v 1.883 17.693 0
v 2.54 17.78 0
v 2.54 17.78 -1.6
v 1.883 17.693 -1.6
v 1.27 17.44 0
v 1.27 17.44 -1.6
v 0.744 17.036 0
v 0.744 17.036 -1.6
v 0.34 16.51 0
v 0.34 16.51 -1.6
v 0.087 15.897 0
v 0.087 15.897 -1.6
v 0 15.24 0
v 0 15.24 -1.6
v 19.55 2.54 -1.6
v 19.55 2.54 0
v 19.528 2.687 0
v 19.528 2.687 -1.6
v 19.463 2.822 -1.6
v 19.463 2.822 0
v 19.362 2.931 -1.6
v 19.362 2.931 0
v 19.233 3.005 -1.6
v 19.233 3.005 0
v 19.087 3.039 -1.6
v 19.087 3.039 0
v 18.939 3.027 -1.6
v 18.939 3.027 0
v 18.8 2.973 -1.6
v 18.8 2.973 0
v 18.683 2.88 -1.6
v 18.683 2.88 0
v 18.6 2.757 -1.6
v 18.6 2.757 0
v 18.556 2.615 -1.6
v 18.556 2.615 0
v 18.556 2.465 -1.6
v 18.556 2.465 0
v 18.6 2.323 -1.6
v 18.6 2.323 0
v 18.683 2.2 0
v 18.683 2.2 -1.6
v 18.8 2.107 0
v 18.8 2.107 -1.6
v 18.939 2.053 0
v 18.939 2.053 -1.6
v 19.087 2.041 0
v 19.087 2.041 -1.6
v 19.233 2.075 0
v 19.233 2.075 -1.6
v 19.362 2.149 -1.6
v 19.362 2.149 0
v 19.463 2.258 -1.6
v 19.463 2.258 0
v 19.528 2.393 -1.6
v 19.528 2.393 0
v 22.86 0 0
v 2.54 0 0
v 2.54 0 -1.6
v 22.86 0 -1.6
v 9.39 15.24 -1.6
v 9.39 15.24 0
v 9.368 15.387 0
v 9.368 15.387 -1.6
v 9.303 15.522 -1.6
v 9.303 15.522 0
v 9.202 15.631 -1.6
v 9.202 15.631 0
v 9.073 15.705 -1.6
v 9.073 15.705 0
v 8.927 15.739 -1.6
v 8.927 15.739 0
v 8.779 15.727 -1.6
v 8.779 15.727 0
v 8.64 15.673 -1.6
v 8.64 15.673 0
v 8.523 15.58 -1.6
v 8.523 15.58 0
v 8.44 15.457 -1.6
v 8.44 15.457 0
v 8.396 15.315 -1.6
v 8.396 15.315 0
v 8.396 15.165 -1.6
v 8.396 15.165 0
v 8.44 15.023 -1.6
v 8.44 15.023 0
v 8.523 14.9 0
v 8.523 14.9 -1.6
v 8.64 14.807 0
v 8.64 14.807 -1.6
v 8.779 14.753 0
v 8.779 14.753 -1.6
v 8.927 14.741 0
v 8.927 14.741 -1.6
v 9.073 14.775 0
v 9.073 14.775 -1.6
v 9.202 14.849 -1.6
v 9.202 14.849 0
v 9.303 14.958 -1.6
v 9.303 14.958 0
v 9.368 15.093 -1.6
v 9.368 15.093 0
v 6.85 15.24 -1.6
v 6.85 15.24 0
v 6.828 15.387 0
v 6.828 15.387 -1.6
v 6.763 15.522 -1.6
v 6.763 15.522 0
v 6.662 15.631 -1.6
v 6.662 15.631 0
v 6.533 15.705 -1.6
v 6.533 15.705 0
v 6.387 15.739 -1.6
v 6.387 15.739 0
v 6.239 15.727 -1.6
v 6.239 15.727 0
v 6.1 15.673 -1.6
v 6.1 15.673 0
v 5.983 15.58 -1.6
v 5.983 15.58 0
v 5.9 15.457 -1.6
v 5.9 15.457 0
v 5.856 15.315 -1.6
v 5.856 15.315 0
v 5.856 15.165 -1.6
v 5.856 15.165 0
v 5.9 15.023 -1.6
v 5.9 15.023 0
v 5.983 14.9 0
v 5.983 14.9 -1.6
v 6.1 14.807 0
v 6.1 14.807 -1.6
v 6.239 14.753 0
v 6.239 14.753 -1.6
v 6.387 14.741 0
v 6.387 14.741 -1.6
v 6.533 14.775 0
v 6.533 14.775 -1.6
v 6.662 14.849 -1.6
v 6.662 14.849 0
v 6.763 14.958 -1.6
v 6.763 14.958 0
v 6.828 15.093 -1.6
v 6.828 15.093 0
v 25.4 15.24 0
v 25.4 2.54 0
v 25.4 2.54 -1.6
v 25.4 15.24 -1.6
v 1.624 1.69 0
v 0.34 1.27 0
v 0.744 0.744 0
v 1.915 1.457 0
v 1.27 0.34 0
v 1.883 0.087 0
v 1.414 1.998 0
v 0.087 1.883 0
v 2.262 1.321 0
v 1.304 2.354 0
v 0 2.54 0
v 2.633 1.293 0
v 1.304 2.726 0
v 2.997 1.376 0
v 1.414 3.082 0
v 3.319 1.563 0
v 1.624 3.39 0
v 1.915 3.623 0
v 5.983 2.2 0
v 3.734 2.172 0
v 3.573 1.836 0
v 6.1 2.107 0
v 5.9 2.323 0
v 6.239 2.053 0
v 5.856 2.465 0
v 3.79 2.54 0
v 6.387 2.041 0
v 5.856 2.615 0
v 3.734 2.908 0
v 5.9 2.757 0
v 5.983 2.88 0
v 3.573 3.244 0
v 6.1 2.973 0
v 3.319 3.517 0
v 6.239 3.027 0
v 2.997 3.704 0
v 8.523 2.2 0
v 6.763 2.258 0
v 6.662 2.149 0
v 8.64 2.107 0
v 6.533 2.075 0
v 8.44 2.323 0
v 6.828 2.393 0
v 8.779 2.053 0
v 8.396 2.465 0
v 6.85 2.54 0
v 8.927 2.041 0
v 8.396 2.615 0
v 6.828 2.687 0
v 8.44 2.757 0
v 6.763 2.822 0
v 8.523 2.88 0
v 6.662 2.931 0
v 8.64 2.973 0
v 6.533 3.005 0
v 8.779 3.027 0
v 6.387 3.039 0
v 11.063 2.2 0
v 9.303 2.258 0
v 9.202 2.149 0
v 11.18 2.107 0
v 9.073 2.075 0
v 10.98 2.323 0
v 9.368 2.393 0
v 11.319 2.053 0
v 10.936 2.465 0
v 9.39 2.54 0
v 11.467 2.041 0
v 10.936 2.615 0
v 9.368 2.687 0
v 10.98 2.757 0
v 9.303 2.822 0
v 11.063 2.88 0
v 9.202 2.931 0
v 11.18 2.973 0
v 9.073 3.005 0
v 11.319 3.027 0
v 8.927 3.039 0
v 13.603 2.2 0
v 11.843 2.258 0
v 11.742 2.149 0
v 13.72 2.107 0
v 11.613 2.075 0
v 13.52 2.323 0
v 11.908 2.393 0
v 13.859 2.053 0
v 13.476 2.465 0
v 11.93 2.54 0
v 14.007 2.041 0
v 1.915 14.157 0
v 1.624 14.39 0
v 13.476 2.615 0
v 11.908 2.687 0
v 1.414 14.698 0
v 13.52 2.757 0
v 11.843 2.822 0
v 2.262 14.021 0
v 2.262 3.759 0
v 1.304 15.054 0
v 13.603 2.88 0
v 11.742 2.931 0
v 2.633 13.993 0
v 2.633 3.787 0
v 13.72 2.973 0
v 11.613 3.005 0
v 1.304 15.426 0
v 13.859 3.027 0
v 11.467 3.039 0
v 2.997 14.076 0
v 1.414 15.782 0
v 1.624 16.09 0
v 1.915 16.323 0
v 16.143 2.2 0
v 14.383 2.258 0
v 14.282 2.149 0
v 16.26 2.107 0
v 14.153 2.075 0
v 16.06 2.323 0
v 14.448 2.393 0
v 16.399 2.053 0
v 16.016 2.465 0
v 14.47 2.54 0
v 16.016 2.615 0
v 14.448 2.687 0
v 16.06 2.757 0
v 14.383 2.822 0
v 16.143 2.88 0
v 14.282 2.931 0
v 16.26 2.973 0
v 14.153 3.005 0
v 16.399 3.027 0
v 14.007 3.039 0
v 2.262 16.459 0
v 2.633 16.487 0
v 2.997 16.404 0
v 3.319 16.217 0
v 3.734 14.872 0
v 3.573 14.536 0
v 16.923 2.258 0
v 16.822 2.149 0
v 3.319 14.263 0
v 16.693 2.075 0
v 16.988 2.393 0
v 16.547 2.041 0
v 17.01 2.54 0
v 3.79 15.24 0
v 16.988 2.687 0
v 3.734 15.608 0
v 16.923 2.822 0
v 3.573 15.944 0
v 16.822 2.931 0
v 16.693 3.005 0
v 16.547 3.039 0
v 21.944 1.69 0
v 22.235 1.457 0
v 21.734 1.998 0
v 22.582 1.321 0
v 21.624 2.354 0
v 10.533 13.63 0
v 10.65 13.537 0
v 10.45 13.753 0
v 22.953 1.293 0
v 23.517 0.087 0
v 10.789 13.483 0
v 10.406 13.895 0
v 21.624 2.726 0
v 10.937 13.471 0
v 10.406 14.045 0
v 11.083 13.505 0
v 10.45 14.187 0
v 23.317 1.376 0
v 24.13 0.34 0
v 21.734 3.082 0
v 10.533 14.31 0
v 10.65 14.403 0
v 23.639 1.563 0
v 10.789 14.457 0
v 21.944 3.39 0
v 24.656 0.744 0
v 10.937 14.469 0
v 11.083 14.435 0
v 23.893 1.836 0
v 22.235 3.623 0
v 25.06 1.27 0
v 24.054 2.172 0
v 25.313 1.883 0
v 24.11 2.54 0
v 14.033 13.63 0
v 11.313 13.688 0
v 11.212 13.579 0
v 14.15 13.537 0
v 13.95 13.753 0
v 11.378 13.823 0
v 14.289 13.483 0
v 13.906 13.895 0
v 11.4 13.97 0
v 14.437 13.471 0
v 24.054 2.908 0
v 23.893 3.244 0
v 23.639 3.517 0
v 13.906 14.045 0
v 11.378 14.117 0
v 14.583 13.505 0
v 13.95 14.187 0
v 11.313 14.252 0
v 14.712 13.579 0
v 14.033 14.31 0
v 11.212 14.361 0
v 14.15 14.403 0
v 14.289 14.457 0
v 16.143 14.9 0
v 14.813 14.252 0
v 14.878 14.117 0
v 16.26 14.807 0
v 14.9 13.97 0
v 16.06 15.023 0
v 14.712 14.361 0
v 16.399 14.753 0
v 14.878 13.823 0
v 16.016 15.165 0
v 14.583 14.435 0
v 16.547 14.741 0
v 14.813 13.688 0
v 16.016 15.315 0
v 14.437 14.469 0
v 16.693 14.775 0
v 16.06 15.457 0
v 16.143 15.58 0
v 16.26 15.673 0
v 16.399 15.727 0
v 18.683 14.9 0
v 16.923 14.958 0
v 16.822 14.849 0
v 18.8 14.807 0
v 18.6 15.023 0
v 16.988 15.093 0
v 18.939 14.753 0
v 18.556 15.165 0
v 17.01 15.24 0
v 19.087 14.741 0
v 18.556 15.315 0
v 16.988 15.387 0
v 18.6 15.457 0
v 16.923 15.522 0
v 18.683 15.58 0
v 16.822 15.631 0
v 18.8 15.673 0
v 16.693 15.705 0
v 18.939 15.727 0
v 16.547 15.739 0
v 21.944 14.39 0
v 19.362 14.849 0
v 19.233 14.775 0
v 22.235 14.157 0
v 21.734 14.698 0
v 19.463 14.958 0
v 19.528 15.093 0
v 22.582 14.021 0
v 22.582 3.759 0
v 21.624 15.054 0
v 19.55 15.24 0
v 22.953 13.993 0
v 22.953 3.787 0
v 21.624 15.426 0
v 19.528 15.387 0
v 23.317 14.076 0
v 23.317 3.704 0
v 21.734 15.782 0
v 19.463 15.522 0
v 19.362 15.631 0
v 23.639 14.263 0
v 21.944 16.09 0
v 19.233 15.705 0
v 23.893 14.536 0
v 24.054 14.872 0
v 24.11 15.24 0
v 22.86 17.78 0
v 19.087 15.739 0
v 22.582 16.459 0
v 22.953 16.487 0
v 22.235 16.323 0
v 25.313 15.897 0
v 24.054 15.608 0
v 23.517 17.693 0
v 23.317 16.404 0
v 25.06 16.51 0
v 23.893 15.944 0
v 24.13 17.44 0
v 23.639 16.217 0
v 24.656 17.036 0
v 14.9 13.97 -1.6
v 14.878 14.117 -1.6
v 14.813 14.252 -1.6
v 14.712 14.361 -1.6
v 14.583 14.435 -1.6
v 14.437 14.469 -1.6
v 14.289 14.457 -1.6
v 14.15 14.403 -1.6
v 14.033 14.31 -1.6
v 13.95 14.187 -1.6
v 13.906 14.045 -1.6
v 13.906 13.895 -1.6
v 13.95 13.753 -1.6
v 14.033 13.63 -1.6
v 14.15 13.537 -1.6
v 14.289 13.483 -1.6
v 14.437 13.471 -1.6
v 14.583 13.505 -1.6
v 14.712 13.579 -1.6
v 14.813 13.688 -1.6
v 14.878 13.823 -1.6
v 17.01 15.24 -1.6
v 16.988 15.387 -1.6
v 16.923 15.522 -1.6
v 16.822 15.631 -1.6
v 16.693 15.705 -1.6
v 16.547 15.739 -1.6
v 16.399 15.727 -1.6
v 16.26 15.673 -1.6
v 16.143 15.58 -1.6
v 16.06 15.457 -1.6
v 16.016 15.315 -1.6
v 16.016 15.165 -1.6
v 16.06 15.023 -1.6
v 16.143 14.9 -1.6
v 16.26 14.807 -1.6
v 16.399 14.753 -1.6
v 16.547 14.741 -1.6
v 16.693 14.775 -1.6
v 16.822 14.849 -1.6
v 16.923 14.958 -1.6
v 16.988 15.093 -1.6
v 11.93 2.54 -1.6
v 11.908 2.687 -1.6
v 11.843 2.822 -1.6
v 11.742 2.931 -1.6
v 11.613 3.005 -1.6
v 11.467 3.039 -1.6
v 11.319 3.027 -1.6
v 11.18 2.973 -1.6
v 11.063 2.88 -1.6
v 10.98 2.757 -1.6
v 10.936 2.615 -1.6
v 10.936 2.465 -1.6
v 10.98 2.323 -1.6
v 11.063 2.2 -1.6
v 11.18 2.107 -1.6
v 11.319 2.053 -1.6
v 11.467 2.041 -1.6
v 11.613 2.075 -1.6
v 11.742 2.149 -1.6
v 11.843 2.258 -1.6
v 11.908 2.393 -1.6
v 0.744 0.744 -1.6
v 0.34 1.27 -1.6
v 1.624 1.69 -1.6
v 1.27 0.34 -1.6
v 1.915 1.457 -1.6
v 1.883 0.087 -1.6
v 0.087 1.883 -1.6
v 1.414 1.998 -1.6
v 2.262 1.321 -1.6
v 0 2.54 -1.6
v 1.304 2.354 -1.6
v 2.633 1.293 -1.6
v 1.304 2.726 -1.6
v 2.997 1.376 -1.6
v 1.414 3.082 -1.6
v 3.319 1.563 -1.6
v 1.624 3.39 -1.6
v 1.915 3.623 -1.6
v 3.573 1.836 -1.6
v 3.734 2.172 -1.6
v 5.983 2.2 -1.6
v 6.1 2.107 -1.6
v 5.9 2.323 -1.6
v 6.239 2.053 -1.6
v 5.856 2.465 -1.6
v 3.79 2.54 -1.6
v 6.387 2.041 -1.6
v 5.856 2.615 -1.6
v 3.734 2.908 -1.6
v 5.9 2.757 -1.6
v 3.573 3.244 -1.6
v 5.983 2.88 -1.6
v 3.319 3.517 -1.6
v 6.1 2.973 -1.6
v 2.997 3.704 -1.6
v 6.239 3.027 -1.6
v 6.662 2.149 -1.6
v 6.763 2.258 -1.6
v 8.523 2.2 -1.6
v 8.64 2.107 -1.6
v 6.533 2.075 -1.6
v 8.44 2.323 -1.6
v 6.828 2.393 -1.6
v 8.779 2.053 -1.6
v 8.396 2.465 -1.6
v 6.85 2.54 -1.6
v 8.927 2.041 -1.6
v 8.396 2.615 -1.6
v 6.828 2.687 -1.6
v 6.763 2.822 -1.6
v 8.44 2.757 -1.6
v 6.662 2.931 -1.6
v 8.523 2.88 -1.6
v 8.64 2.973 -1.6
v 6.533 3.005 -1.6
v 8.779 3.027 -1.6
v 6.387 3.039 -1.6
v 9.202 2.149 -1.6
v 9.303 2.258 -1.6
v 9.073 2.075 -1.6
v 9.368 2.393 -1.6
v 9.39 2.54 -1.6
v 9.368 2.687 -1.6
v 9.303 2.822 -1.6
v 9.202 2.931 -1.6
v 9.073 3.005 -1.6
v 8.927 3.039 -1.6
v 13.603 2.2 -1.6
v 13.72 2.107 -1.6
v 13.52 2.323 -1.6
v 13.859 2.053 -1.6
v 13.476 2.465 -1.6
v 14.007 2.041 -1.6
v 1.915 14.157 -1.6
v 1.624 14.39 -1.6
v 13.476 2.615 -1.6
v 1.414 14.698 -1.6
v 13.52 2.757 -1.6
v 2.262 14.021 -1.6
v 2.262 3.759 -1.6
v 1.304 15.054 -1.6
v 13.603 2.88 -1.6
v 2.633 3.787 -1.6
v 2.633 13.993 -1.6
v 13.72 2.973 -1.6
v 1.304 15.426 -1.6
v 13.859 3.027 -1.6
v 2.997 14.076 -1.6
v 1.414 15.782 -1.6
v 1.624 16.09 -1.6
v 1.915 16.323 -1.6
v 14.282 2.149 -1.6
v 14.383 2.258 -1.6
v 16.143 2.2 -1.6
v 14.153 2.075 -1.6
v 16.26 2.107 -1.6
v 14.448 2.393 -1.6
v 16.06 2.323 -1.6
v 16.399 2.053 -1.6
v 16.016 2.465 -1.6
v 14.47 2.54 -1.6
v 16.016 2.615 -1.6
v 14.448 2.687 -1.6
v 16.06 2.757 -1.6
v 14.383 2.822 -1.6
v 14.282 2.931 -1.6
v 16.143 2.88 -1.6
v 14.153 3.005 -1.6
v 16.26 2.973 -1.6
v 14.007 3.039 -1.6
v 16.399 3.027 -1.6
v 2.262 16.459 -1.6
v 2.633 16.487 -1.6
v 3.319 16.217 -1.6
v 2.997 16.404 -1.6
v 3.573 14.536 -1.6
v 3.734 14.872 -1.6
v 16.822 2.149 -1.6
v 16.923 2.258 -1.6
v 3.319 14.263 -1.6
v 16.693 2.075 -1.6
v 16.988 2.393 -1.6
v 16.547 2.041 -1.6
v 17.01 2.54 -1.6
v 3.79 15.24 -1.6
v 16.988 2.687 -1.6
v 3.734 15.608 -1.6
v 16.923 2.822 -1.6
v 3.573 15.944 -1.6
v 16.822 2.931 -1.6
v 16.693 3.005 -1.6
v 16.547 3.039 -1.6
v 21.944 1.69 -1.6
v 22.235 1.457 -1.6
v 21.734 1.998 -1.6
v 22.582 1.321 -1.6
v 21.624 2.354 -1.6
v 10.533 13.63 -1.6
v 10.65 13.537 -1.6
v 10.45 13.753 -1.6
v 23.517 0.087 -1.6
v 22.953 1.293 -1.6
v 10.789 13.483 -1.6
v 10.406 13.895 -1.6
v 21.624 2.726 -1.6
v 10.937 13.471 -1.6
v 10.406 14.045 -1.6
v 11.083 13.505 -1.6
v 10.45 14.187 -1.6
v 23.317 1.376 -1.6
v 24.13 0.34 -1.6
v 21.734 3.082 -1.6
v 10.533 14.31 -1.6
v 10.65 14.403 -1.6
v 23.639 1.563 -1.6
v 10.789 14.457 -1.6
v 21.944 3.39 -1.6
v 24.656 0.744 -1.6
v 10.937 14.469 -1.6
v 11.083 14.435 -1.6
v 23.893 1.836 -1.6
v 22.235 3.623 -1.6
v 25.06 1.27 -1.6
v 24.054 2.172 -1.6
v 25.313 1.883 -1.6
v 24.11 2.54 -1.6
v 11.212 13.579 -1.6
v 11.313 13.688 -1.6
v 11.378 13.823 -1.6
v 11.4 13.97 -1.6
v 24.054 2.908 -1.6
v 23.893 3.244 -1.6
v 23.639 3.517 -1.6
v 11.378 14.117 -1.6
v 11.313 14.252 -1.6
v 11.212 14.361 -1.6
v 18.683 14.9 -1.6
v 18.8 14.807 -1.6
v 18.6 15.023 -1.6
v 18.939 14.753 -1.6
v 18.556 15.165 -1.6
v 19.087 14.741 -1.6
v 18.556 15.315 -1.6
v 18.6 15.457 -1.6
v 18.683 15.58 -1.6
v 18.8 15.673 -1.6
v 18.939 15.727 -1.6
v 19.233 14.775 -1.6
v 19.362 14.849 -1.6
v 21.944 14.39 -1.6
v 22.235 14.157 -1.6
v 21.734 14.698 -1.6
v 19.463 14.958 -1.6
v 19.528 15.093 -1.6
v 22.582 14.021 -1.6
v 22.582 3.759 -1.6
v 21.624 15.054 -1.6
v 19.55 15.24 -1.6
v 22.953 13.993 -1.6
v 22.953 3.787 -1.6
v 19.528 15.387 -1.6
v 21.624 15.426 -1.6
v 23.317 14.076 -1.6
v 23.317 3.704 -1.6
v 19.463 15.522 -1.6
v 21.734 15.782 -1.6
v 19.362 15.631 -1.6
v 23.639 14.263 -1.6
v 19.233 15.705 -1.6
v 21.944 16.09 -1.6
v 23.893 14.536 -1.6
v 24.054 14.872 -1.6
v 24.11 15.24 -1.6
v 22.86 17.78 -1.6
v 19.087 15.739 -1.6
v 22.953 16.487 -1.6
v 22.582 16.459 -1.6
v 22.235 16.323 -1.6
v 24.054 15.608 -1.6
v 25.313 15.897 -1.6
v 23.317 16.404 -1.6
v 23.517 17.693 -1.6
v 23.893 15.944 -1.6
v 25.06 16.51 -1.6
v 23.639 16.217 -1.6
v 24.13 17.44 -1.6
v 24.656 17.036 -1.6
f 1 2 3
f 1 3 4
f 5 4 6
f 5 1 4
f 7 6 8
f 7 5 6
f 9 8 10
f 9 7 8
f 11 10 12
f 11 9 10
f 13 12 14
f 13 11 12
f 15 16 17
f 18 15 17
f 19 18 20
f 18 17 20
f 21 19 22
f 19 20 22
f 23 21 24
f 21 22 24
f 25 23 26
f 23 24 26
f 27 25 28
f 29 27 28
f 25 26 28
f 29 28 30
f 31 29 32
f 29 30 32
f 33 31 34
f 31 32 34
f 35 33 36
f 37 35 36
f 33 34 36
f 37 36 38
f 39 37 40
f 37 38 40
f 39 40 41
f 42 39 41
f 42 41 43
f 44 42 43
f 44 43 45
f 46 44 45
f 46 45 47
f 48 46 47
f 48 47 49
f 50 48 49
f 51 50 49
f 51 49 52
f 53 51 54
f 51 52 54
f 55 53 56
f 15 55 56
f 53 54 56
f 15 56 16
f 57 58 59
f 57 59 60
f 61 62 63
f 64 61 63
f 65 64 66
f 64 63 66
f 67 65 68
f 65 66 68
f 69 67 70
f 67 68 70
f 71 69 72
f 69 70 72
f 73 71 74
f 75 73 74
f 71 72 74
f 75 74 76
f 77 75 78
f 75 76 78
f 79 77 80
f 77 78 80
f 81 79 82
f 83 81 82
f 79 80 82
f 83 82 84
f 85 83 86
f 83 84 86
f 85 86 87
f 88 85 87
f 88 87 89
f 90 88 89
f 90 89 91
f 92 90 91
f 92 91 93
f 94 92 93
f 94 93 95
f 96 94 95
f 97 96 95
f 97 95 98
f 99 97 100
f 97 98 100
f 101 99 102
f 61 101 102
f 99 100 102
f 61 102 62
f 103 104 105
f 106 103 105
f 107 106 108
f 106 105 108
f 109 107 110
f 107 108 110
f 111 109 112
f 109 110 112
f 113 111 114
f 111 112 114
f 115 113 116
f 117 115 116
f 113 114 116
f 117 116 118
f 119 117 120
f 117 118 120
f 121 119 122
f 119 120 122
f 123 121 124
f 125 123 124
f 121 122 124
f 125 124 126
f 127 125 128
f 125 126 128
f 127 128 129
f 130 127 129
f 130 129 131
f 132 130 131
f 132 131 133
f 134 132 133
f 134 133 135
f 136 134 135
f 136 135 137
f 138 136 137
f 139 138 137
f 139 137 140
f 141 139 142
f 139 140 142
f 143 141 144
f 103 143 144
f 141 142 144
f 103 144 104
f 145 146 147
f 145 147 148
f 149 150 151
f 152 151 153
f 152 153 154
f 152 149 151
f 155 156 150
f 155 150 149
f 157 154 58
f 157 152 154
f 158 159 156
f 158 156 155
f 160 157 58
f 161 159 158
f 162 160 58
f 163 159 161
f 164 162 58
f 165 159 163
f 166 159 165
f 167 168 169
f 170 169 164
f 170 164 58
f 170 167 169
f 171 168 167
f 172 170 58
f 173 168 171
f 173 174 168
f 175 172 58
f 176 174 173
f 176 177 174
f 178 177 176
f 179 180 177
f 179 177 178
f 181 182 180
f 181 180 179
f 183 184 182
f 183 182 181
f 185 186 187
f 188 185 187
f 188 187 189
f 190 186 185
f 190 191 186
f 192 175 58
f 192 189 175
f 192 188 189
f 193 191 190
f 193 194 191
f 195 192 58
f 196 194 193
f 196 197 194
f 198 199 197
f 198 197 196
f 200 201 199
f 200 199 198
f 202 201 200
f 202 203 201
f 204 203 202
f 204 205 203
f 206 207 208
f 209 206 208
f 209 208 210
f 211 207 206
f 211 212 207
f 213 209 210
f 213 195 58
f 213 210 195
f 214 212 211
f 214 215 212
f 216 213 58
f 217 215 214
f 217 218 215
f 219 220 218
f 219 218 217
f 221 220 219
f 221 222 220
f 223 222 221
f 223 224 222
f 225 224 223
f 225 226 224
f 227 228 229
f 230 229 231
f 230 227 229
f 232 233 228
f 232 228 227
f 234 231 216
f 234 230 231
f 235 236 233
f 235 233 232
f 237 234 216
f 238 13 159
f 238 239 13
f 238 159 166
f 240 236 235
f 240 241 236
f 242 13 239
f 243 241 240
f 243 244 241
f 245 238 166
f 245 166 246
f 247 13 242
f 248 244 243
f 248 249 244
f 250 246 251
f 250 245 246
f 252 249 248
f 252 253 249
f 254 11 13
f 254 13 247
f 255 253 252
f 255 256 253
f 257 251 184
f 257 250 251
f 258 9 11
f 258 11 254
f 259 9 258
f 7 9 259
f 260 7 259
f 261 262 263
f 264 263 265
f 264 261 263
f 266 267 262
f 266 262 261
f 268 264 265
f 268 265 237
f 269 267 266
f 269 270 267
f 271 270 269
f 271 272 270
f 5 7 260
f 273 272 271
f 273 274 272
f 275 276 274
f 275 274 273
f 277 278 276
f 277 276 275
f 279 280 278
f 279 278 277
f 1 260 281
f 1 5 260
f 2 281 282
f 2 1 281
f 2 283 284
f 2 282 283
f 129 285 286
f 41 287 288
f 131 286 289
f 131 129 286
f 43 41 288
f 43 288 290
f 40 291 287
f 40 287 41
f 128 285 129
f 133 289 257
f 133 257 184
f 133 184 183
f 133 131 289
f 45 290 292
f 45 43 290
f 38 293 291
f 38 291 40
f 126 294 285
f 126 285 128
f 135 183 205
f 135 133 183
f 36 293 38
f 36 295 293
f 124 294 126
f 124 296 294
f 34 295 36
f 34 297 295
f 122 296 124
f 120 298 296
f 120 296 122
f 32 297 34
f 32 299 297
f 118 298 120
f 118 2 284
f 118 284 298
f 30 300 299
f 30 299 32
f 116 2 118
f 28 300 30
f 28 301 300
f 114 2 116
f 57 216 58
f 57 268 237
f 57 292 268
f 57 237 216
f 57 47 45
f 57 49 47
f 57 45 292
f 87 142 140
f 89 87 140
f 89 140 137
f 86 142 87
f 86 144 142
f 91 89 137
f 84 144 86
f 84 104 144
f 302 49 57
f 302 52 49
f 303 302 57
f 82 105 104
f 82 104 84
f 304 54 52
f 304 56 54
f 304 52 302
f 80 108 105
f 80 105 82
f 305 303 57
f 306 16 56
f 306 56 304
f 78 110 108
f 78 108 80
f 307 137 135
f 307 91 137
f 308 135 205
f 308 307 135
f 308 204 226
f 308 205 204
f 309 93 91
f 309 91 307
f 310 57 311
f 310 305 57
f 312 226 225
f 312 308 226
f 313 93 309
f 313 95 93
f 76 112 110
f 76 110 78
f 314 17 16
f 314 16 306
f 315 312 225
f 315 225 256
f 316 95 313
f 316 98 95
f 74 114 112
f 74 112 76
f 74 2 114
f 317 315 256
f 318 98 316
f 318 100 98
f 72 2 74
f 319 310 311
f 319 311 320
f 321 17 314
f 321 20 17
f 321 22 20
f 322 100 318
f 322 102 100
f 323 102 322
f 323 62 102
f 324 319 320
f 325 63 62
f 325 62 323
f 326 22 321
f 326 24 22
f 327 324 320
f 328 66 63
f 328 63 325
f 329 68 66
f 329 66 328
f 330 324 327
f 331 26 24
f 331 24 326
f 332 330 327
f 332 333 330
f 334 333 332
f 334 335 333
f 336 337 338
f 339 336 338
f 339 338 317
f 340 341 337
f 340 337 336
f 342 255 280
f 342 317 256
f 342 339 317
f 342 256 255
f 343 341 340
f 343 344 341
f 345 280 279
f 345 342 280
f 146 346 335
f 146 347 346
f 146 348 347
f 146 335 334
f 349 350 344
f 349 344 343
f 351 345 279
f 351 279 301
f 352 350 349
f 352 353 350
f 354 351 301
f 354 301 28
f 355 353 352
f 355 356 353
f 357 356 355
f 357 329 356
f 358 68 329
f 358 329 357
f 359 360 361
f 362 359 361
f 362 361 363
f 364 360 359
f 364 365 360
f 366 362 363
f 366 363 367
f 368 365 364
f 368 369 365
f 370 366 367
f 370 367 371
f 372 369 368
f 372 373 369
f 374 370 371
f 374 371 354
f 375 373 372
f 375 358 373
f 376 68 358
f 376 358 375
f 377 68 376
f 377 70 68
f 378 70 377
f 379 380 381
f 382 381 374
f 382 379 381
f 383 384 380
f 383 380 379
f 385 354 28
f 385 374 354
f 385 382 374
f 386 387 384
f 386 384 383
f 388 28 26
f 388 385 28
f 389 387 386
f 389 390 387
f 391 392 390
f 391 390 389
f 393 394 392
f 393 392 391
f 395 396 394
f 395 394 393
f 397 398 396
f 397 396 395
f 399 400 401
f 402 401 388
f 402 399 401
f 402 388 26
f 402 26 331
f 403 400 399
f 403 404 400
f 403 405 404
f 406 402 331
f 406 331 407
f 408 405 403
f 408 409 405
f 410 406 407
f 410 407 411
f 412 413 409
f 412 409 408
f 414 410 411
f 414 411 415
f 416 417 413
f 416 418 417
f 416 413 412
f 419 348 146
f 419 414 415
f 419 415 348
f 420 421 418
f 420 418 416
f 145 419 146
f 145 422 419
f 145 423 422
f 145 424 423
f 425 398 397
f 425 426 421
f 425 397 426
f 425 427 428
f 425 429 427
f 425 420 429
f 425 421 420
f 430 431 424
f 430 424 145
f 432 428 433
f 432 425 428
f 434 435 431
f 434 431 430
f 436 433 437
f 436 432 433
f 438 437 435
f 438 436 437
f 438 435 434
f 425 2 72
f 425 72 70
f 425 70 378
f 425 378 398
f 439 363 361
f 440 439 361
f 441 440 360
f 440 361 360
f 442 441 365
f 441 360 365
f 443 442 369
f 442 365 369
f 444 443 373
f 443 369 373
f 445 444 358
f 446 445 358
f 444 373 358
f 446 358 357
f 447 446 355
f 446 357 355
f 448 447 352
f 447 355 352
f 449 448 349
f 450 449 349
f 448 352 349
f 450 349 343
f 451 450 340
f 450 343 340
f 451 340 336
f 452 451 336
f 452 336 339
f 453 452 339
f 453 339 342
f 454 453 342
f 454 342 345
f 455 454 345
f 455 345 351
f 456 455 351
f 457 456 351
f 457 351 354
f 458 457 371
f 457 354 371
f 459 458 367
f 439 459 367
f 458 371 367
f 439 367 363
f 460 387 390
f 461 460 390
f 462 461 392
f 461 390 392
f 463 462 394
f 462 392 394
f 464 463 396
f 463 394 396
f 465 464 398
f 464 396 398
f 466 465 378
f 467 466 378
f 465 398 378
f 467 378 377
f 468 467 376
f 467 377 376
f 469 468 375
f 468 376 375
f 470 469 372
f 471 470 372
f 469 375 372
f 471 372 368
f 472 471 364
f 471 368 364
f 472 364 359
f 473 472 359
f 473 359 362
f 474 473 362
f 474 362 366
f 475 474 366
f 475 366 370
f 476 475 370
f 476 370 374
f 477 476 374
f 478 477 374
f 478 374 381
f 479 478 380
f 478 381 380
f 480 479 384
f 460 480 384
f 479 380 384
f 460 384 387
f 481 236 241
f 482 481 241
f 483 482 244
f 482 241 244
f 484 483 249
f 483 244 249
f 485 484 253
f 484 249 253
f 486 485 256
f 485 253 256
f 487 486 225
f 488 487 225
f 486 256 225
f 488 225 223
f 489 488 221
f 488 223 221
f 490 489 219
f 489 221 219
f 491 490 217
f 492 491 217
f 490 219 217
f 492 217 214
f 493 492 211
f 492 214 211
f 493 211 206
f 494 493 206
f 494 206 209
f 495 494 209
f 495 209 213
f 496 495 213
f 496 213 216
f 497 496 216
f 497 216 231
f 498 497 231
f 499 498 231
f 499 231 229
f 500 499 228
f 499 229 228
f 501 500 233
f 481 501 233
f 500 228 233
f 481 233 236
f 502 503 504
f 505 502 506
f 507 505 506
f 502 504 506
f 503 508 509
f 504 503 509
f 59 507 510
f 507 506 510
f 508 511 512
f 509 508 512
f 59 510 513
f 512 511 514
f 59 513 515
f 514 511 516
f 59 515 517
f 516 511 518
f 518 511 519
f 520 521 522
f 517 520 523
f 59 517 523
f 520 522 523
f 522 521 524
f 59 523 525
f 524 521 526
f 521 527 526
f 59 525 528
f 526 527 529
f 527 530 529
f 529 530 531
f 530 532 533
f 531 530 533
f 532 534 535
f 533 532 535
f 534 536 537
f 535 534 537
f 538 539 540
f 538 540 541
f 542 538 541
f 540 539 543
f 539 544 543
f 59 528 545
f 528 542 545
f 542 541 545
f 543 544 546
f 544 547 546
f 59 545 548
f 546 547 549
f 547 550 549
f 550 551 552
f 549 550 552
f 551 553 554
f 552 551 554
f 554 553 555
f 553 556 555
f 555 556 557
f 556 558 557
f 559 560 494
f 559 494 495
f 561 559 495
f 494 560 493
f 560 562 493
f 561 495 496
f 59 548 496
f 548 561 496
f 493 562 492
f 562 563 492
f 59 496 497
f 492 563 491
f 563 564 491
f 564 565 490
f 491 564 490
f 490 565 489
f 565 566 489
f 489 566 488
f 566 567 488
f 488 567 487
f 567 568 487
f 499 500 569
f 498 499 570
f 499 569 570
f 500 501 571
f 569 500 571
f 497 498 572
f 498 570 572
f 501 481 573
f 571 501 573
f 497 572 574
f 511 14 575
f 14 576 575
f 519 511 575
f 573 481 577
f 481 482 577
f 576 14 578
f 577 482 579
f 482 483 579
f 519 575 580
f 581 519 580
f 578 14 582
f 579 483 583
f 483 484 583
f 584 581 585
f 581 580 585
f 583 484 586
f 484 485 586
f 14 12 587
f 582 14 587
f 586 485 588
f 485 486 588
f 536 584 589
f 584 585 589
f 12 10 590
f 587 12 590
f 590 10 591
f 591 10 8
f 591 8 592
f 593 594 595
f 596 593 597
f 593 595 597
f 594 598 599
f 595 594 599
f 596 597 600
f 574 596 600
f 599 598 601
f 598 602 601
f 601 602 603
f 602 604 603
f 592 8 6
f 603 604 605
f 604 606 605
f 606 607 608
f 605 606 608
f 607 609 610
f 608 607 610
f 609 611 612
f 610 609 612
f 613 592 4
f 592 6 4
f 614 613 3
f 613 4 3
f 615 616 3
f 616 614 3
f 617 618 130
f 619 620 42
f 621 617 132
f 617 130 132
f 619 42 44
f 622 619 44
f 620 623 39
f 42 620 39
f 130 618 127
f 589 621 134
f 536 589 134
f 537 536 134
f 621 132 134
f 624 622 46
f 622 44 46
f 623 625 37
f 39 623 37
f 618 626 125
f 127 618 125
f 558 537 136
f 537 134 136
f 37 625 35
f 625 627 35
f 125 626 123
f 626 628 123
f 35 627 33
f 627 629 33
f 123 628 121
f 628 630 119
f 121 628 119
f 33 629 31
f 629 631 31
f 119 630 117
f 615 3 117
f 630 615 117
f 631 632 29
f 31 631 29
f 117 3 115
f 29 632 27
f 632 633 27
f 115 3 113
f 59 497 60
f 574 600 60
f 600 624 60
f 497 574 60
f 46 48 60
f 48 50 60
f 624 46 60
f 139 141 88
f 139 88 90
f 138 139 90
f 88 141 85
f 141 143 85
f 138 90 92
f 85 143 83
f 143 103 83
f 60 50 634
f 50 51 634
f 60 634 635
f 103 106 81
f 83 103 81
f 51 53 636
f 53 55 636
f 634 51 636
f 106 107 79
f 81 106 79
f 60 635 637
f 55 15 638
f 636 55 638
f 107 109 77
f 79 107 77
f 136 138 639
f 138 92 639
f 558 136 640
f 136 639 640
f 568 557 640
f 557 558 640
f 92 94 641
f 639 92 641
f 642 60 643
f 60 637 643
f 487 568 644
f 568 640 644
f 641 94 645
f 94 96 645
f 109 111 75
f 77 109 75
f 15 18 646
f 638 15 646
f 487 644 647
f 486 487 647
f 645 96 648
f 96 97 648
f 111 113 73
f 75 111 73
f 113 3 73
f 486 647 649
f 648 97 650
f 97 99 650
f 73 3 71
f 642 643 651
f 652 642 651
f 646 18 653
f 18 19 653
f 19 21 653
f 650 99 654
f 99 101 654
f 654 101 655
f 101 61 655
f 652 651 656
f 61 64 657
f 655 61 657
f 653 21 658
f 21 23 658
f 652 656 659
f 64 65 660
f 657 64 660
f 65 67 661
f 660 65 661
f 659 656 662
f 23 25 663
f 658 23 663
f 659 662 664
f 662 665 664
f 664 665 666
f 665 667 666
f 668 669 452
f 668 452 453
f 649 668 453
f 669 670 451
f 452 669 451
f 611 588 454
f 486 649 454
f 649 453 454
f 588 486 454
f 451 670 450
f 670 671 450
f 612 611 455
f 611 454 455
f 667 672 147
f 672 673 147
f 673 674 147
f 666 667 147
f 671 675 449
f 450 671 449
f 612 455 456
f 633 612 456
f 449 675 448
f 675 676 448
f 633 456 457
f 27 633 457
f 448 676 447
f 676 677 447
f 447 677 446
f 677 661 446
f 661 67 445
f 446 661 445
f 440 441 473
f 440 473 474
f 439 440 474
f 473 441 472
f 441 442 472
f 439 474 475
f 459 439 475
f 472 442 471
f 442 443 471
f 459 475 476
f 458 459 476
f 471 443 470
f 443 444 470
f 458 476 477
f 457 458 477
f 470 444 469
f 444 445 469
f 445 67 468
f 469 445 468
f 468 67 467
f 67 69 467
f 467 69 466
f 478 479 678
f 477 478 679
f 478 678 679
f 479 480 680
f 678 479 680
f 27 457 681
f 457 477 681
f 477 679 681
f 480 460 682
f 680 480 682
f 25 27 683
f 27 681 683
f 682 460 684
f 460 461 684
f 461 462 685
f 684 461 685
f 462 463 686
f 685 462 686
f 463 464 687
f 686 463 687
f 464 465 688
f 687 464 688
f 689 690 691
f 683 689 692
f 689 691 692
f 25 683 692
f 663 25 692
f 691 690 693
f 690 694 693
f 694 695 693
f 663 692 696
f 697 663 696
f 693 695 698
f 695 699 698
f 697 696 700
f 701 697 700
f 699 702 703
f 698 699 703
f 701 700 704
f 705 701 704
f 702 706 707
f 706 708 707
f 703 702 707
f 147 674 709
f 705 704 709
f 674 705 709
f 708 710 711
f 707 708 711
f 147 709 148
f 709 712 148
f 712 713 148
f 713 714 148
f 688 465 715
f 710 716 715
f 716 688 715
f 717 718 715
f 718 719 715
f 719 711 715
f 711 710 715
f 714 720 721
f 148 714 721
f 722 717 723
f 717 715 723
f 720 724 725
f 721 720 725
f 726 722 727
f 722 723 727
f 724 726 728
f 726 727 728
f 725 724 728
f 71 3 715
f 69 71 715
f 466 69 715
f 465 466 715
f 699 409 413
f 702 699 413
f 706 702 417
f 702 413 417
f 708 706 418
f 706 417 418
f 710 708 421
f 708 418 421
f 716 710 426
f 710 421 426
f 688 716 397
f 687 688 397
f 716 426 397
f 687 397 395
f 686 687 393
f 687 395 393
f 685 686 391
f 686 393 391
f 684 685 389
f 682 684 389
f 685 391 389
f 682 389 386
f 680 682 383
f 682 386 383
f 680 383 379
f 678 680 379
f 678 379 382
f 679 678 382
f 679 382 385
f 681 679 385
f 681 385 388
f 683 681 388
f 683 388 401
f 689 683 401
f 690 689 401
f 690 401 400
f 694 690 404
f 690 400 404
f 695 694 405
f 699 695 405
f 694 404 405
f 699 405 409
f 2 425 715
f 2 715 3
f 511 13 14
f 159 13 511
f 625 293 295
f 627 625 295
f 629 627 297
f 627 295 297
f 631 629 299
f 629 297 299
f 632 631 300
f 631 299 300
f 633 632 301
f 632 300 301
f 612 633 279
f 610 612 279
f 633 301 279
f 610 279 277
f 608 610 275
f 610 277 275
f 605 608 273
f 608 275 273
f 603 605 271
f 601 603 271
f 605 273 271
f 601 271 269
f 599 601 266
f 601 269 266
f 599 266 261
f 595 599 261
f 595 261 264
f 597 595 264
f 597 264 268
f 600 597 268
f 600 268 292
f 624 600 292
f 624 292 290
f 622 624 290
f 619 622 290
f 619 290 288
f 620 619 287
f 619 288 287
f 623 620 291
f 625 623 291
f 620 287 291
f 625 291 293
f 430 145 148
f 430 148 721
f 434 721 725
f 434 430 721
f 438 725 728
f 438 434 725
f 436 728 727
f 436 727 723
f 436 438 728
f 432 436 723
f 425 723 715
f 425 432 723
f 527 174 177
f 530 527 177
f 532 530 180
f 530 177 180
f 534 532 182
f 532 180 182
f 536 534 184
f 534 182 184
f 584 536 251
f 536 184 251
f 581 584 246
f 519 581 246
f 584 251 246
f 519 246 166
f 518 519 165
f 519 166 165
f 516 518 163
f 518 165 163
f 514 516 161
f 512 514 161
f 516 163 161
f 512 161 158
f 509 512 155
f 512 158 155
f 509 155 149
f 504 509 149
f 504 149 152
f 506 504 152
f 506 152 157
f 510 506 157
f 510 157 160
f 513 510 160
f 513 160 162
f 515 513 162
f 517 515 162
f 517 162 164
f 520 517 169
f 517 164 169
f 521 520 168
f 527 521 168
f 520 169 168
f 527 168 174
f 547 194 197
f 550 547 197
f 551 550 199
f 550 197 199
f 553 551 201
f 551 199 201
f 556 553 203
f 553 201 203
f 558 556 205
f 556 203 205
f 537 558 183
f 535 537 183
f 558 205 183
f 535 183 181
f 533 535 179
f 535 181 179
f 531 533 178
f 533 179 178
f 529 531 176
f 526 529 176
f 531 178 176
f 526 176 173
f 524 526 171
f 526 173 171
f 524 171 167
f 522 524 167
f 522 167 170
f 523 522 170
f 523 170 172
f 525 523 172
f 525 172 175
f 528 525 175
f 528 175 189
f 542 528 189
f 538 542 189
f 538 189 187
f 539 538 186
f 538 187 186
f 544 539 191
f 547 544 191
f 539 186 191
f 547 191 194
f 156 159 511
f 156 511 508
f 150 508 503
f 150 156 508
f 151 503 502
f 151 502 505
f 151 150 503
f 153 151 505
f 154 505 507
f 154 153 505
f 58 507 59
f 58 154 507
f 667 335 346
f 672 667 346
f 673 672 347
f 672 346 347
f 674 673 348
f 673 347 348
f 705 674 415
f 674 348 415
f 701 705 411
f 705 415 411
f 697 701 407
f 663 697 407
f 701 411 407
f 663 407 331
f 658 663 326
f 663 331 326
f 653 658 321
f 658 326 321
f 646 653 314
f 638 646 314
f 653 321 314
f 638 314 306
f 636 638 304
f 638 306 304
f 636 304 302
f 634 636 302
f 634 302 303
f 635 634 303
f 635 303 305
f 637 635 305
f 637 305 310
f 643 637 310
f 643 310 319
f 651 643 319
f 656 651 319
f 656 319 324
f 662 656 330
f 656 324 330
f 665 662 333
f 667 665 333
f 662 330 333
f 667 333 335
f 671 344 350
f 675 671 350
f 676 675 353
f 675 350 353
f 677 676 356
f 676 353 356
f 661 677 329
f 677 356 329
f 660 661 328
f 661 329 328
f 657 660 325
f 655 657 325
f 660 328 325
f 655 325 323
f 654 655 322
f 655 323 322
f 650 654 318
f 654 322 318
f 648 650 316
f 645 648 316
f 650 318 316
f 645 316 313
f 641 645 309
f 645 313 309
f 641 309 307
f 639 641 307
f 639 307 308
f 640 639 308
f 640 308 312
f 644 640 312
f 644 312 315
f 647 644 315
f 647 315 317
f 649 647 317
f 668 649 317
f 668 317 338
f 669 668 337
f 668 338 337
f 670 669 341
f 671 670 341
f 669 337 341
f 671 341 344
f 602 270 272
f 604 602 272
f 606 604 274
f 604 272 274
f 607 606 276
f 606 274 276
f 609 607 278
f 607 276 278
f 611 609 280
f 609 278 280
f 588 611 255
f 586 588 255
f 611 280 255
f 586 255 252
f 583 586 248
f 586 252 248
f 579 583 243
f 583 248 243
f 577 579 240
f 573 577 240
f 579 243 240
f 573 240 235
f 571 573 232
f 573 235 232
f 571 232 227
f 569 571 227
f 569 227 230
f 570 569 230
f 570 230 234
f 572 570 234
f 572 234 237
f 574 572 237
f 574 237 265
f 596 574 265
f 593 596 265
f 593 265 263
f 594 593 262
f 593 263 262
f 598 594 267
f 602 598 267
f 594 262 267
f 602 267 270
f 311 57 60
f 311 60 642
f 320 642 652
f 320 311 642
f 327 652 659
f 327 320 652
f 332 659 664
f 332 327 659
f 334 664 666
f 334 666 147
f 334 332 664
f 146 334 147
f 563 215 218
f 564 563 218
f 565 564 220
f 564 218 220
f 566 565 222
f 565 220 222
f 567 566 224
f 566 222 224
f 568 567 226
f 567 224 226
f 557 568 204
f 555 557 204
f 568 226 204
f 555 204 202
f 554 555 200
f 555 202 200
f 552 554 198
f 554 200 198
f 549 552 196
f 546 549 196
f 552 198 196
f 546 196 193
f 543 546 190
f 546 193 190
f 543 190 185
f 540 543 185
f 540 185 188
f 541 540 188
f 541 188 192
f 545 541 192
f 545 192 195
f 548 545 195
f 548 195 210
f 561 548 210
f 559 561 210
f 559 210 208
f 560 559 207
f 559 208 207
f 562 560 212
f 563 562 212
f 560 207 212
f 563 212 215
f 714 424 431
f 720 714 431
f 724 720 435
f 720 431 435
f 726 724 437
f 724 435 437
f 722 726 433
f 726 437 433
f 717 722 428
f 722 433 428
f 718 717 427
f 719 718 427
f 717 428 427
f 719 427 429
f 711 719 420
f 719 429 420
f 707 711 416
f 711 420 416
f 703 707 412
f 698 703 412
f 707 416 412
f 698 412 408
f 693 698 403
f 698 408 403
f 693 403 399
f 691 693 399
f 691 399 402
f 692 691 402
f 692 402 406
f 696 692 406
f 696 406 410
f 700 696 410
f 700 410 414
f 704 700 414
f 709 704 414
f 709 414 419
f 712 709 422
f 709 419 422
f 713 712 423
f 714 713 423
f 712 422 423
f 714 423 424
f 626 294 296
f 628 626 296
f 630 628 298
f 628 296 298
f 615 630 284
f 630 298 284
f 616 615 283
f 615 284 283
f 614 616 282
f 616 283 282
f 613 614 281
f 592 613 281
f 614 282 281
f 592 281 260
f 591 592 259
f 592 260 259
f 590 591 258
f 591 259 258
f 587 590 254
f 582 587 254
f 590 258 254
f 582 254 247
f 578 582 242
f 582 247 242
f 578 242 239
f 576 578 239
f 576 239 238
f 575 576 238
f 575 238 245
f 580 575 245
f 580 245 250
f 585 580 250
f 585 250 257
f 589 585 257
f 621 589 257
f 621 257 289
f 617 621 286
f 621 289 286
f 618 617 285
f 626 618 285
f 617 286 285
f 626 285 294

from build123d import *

# Parameters (mm, degrees)
MODEL_R             = 0.5
MODEL_R_2           = 1.25
BOSS_EXTRUDE1_DEPTH = 1.6


with BuildPart() as part:
    # Model → Boss-Extrude1 (new body)
    with BuildSketch(Plane.XY):
        with BuildLine():
            Line((0, 15.24), (0, 2.54))
            ThreePointArc((0, 2.54), (0.743948776, 0.743948776), (2.54, 0))
            Line((2.54, 0), (22.86, 0))
            ThreePointArc((22.86, 0), (24.656051224, 0.743948776), (25.4, 2.54))
            Line((25.4, 2.54), (25.4, 15.24))
            ThreePointArc((25.4, 15.24), (24.656051224, 17.036051224), (22.86, 17.78))
            Line((22.86, 17.78), (2.54, 17.78))
            ThreePointArc((2.54, 17.78), (0.743948776, 17.036051224), (0, 15.24))
        make_face()
        with Locations((6.35, 2.54)):
            Circle(MODEL_R, mode=Mode.SUBTRACT)
        with Locations((8.89, 2.54)):
            Circle(MODEL_R, mode=Mode.SUBTRACT)
        with Locations((11.43, 2.54)):
            Circle(MODEL_R, mode=Mode.SUBTRACT)
        with Locations((13.97, 2.54)):
            Circle(MODEL_R, mode=Mode.SUBTRACT)
        with Locations((16.51, 2.54)):
            Circle(MODEL_R, mode=Mode.SUBTRACT)
        with Locations((19.05, 2.54)):
            Circle(MODEL_R, mode=Mode.SUBTRACT)
        with Locations((16.51, 15.24)):
            Circle(MODEL_R, mode=Mode.SUBTRACT)
        with Locations((19.05, 15.24)):
            Circle(MODEL_R, mode=Mode.SUBTRACT)
        with Locations((6.35, 15.24)):
            Circle(MODEL_R, mode=Mode.SUBTRACT)
        with Locations((8.89, 15.24)):
            Circle(MODEL_R, mode=Mode.SUBTRACT)
        with Locations((2.54, 15.24)):
            Circle(MODEL_R_2, mode=Mode.SUBTRACT)
        with Locations((22.86, 15.24)):
            Circle(MODEL_R_2, mode=Mode.SUBTRACT)
        with Locations((2.54, 2.54)):
            Circle(MODEL_R_2, mode=Mode.SUBTRACT)
        with Locations((22.86, 2.54)):
            Circle(MODEL_R_2, mode=Mode.SUBTRACT)
        with Locations((10.9, 13.97)):
            Circle(MODEL_R, mode=Mode.SUBTRACT)
        with Locations((14.4, 13.97)):
            Circle(MODEL_R, mode=Mode.SUBTRACT)
    extrude(amount=-BOSS_EXTRUDE1_DEPTH)


solid = part.part
